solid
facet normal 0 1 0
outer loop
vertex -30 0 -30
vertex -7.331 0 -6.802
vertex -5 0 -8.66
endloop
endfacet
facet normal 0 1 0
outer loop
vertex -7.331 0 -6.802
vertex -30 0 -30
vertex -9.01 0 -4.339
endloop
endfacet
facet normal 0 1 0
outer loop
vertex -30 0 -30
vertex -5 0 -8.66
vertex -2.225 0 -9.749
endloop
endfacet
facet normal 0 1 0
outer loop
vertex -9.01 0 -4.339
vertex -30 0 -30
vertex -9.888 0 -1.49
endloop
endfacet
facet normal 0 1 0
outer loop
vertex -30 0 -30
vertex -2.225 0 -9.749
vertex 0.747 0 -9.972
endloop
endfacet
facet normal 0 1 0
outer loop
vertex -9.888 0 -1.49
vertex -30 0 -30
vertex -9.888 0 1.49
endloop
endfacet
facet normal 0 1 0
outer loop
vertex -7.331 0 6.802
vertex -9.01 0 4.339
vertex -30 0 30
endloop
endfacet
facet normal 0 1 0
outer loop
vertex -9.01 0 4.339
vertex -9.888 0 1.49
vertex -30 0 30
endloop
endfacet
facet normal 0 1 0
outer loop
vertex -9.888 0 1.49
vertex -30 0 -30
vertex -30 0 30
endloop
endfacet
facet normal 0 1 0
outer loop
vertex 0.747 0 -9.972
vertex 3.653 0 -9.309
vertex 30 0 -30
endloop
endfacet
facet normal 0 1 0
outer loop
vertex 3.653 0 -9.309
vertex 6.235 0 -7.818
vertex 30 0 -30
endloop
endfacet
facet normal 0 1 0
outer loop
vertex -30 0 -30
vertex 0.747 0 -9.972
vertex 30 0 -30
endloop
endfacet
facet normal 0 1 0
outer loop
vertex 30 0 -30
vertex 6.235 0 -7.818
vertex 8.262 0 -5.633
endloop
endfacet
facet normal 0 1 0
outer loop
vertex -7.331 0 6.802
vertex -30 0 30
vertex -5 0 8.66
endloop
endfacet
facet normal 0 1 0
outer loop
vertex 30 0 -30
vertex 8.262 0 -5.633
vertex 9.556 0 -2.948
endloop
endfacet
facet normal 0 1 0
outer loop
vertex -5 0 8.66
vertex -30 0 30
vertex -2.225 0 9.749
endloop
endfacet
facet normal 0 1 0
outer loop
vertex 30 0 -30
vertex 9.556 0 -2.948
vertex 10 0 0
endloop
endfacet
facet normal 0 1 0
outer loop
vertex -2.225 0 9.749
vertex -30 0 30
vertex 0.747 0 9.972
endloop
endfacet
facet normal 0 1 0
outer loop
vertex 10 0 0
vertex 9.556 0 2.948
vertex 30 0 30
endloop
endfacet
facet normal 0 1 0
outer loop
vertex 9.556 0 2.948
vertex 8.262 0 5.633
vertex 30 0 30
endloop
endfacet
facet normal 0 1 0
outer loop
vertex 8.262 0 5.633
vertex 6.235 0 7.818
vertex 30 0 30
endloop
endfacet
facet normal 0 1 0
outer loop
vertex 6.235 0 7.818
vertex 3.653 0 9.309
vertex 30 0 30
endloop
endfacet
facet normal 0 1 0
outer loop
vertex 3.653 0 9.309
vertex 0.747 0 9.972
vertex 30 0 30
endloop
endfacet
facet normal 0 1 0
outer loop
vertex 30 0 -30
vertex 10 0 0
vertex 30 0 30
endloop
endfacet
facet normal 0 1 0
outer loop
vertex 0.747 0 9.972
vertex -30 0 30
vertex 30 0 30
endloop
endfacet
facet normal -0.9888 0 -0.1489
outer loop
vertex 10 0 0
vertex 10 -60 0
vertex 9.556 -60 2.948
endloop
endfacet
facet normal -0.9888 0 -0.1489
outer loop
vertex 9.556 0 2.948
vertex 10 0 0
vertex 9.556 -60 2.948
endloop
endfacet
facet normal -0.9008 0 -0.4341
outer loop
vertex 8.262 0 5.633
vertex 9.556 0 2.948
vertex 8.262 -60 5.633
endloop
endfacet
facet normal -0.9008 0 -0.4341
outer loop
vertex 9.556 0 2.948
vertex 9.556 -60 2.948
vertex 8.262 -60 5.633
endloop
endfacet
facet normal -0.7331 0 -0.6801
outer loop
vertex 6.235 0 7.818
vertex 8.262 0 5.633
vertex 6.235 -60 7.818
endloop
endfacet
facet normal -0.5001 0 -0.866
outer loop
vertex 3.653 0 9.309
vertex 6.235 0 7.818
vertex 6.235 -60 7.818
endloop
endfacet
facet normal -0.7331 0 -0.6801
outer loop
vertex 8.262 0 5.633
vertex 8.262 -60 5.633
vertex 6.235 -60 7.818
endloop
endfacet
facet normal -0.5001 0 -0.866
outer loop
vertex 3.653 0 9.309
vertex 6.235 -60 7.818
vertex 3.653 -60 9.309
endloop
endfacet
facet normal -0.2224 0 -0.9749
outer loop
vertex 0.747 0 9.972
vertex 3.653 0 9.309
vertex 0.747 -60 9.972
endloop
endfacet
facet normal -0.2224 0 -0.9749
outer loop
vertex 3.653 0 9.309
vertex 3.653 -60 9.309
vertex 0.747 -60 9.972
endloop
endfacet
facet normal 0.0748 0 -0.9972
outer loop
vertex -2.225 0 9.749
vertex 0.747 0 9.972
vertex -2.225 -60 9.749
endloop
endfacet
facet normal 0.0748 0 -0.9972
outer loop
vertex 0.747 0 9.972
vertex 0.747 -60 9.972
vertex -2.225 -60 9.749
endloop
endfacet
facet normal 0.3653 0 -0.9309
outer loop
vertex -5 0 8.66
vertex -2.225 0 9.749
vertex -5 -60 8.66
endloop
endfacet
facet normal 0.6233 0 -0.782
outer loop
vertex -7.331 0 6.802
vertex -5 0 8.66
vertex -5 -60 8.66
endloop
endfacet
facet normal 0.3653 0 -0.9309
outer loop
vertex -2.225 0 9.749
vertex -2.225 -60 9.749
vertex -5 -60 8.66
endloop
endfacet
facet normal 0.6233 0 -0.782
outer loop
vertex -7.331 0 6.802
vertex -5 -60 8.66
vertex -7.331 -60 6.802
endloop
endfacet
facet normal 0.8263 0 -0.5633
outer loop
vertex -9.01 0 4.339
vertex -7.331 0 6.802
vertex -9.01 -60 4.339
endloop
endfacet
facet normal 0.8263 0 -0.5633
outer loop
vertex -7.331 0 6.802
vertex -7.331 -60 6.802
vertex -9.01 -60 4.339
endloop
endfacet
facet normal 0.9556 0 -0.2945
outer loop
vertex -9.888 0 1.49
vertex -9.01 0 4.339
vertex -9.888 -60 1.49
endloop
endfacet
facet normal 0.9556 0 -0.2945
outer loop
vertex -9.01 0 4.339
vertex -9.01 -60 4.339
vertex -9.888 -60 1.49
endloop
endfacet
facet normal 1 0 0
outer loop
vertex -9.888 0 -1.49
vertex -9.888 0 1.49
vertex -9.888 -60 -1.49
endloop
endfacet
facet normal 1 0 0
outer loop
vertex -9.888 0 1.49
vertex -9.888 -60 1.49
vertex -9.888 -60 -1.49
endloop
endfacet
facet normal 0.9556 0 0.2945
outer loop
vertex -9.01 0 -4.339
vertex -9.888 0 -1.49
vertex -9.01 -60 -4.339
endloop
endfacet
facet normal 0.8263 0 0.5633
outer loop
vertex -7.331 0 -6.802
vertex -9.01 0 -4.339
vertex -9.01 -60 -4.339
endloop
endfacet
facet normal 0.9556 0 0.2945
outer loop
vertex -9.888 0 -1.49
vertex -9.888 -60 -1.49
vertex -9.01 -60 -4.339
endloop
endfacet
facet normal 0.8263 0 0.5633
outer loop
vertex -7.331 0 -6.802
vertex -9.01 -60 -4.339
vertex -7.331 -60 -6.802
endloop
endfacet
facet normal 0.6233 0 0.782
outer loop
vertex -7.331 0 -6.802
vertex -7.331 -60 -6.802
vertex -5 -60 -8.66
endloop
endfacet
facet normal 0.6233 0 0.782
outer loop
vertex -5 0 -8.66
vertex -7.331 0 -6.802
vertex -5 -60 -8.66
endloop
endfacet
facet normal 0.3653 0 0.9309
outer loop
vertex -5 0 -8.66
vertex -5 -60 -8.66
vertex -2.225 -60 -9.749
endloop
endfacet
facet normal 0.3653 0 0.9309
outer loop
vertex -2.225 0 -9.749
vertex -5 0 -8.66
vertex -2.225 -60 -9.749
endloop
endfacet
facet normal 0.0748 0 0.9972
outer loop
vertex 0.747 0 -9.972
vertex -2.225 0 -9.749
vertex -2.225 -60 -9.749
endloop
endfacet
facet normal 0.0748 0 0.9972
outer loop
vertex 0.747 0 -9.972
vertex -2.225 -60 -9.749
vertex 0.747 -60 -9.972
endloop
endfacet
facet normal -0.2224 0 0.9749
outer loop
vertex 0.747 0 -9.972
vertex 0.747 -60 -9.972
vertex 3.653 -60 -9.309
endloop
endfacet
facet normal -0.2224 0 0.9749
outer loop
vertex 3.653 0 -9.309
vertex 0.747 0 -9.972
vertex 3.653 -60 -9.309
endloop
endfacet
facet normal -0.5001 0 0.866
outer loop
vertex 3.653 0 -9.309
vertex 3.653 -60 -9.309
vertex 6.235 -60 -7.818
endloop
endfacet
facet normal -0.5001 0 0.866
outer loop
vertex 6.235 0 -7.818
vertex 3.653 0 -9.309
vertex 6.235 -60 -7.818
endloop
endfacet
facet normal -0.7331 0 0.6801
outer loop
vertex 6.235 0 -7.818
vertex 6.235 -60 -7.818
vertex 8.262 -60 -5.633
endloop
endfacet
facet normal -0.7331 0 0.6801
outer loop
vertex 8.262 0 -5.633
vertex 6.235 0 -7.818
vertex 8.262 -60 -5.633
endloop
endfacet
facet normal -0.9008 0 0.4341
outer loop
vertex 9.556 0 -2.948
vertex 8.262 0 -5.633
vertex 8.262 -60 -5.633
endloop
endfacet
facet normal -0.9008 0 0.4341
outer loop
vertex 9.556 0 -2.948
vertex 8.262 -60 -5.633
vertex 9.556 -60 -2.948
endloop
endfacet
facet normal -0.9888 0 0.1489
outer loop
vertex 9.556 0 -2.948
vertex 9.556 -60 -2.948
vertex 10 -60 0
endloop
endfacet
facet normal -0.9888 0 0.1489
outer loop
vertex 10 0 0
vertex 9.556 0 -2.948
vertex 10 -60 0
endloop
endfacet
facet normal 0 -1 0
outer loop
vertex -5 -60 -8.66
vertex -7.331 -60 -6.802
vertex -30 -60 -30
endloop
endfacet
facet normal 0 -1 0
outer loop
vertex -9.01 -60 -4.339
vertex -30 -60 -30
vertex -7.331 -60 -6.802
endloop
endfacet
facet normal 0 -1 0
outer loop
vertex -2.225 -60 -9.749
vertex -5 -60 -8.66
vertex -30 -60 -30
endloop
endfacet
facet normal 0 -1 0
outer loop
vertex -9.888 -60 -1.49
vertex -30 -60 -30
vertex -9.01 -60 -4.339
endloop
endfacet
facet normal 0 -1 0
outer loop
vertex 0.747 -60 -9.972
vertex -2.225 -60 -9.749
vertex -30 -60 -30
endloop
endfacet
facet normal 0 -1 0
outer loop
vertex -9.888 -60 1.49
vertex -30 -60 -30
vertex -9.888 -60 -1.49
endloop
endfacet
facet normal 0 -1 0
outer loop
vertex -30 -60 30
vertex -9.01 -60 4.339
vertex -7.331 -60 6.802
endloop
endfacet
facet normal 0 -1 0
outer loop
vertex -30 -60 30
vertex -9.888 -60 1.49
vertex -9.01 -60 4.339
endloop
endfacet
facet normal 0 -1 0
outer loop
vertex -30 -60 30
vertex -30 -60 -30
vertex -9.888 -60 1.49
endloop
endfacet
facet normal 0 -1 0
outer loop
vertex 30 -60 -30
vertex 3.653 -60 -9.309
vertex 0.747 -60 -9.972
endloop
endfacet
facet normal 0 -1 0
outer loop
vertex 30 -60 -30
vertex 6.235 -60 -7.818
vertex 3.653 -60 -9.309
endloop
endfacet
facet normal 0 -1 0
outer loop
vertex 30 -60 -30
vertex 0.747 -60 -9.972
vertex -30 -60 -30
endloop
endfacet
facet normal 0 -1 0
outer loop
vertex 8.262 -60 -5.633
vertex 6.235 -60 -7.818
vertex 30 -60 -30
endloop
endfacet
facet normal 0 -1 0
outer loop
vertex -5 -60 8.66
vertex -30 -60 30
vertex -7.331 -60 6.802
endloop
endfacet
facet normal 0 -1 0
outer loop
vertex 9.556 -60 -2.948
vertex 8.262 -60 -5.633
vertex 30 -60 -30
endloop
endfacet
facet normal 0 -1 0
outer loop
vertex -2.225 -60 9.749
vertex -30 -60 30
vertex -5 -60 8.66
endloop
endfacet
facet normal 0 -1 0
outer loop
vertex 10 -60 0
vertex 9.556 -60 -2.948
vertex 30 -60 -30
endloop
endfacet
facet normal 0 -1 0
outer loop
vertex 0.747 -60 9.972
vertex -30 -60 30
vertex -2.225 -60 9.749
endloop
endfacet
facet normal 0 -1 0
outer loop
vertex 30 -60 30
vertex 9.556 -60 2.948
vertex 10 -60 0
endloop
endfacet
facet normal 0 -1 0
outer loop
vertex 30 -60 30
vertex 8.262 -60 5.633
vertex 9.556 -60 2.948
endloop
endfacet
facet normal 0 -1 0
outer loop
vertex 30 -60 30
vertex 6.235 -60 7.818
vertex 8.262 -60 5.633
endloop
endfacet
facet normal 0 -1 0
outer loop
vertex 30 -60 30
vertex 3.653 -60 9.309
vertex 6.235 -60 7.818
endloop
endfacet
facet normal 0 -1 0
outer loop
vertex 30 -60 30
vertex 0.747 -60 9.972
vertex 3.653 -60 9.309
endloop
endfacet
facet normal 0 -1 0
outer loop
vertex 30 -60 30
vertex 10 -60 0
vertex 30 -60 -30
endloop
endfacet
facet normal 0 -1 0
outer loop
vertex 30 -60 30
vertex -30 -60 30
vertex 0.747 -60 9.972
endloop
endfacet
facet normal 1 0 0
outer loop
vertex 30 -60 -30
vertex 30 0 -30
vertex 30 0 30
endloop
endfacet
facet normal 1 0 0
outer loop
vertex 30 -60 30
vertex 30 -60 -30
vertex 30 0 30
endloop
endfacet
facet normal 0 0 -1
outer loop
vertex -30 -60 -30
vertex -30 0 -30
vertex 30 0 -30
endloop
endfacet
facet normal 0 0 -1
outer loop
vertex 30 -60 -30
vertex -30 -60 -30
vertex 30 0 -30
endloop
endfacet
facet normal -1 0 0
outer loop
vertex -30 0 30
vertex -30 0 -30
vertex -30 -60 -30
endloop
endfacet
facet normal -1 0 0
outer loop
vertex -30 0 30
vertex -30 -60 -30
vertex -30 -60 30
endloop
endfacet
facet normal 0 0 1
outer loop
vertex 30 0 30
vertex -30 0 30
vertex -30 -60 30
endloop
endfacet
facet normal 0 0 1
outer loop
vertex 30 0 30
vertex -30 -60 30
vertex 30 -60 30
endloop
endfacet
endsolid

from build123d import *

# Parameters (mm, degrees)
F0_W     = 60
F0_H     = 60
F1_DEPTH = 60
F2_R     = 10
F3_DEPTH = 60.001


with BuildPart() as f1:
    # F0 (on Front) → F1 (new body)
    with BuildSketch(Plane.XZ):
        Rectangle(F0_W, F0_H)
    extrude(amount=F1_DEPTH)

    # F2 (on face) → F3 (cut, through all)
    with BuildSketch(Plane.XZ.offset(60)):
        Circle(F2_R)
    extrude(amount=-F3_DEPTH, mode=Mode.SUBTRACT)


solid = f1.part
